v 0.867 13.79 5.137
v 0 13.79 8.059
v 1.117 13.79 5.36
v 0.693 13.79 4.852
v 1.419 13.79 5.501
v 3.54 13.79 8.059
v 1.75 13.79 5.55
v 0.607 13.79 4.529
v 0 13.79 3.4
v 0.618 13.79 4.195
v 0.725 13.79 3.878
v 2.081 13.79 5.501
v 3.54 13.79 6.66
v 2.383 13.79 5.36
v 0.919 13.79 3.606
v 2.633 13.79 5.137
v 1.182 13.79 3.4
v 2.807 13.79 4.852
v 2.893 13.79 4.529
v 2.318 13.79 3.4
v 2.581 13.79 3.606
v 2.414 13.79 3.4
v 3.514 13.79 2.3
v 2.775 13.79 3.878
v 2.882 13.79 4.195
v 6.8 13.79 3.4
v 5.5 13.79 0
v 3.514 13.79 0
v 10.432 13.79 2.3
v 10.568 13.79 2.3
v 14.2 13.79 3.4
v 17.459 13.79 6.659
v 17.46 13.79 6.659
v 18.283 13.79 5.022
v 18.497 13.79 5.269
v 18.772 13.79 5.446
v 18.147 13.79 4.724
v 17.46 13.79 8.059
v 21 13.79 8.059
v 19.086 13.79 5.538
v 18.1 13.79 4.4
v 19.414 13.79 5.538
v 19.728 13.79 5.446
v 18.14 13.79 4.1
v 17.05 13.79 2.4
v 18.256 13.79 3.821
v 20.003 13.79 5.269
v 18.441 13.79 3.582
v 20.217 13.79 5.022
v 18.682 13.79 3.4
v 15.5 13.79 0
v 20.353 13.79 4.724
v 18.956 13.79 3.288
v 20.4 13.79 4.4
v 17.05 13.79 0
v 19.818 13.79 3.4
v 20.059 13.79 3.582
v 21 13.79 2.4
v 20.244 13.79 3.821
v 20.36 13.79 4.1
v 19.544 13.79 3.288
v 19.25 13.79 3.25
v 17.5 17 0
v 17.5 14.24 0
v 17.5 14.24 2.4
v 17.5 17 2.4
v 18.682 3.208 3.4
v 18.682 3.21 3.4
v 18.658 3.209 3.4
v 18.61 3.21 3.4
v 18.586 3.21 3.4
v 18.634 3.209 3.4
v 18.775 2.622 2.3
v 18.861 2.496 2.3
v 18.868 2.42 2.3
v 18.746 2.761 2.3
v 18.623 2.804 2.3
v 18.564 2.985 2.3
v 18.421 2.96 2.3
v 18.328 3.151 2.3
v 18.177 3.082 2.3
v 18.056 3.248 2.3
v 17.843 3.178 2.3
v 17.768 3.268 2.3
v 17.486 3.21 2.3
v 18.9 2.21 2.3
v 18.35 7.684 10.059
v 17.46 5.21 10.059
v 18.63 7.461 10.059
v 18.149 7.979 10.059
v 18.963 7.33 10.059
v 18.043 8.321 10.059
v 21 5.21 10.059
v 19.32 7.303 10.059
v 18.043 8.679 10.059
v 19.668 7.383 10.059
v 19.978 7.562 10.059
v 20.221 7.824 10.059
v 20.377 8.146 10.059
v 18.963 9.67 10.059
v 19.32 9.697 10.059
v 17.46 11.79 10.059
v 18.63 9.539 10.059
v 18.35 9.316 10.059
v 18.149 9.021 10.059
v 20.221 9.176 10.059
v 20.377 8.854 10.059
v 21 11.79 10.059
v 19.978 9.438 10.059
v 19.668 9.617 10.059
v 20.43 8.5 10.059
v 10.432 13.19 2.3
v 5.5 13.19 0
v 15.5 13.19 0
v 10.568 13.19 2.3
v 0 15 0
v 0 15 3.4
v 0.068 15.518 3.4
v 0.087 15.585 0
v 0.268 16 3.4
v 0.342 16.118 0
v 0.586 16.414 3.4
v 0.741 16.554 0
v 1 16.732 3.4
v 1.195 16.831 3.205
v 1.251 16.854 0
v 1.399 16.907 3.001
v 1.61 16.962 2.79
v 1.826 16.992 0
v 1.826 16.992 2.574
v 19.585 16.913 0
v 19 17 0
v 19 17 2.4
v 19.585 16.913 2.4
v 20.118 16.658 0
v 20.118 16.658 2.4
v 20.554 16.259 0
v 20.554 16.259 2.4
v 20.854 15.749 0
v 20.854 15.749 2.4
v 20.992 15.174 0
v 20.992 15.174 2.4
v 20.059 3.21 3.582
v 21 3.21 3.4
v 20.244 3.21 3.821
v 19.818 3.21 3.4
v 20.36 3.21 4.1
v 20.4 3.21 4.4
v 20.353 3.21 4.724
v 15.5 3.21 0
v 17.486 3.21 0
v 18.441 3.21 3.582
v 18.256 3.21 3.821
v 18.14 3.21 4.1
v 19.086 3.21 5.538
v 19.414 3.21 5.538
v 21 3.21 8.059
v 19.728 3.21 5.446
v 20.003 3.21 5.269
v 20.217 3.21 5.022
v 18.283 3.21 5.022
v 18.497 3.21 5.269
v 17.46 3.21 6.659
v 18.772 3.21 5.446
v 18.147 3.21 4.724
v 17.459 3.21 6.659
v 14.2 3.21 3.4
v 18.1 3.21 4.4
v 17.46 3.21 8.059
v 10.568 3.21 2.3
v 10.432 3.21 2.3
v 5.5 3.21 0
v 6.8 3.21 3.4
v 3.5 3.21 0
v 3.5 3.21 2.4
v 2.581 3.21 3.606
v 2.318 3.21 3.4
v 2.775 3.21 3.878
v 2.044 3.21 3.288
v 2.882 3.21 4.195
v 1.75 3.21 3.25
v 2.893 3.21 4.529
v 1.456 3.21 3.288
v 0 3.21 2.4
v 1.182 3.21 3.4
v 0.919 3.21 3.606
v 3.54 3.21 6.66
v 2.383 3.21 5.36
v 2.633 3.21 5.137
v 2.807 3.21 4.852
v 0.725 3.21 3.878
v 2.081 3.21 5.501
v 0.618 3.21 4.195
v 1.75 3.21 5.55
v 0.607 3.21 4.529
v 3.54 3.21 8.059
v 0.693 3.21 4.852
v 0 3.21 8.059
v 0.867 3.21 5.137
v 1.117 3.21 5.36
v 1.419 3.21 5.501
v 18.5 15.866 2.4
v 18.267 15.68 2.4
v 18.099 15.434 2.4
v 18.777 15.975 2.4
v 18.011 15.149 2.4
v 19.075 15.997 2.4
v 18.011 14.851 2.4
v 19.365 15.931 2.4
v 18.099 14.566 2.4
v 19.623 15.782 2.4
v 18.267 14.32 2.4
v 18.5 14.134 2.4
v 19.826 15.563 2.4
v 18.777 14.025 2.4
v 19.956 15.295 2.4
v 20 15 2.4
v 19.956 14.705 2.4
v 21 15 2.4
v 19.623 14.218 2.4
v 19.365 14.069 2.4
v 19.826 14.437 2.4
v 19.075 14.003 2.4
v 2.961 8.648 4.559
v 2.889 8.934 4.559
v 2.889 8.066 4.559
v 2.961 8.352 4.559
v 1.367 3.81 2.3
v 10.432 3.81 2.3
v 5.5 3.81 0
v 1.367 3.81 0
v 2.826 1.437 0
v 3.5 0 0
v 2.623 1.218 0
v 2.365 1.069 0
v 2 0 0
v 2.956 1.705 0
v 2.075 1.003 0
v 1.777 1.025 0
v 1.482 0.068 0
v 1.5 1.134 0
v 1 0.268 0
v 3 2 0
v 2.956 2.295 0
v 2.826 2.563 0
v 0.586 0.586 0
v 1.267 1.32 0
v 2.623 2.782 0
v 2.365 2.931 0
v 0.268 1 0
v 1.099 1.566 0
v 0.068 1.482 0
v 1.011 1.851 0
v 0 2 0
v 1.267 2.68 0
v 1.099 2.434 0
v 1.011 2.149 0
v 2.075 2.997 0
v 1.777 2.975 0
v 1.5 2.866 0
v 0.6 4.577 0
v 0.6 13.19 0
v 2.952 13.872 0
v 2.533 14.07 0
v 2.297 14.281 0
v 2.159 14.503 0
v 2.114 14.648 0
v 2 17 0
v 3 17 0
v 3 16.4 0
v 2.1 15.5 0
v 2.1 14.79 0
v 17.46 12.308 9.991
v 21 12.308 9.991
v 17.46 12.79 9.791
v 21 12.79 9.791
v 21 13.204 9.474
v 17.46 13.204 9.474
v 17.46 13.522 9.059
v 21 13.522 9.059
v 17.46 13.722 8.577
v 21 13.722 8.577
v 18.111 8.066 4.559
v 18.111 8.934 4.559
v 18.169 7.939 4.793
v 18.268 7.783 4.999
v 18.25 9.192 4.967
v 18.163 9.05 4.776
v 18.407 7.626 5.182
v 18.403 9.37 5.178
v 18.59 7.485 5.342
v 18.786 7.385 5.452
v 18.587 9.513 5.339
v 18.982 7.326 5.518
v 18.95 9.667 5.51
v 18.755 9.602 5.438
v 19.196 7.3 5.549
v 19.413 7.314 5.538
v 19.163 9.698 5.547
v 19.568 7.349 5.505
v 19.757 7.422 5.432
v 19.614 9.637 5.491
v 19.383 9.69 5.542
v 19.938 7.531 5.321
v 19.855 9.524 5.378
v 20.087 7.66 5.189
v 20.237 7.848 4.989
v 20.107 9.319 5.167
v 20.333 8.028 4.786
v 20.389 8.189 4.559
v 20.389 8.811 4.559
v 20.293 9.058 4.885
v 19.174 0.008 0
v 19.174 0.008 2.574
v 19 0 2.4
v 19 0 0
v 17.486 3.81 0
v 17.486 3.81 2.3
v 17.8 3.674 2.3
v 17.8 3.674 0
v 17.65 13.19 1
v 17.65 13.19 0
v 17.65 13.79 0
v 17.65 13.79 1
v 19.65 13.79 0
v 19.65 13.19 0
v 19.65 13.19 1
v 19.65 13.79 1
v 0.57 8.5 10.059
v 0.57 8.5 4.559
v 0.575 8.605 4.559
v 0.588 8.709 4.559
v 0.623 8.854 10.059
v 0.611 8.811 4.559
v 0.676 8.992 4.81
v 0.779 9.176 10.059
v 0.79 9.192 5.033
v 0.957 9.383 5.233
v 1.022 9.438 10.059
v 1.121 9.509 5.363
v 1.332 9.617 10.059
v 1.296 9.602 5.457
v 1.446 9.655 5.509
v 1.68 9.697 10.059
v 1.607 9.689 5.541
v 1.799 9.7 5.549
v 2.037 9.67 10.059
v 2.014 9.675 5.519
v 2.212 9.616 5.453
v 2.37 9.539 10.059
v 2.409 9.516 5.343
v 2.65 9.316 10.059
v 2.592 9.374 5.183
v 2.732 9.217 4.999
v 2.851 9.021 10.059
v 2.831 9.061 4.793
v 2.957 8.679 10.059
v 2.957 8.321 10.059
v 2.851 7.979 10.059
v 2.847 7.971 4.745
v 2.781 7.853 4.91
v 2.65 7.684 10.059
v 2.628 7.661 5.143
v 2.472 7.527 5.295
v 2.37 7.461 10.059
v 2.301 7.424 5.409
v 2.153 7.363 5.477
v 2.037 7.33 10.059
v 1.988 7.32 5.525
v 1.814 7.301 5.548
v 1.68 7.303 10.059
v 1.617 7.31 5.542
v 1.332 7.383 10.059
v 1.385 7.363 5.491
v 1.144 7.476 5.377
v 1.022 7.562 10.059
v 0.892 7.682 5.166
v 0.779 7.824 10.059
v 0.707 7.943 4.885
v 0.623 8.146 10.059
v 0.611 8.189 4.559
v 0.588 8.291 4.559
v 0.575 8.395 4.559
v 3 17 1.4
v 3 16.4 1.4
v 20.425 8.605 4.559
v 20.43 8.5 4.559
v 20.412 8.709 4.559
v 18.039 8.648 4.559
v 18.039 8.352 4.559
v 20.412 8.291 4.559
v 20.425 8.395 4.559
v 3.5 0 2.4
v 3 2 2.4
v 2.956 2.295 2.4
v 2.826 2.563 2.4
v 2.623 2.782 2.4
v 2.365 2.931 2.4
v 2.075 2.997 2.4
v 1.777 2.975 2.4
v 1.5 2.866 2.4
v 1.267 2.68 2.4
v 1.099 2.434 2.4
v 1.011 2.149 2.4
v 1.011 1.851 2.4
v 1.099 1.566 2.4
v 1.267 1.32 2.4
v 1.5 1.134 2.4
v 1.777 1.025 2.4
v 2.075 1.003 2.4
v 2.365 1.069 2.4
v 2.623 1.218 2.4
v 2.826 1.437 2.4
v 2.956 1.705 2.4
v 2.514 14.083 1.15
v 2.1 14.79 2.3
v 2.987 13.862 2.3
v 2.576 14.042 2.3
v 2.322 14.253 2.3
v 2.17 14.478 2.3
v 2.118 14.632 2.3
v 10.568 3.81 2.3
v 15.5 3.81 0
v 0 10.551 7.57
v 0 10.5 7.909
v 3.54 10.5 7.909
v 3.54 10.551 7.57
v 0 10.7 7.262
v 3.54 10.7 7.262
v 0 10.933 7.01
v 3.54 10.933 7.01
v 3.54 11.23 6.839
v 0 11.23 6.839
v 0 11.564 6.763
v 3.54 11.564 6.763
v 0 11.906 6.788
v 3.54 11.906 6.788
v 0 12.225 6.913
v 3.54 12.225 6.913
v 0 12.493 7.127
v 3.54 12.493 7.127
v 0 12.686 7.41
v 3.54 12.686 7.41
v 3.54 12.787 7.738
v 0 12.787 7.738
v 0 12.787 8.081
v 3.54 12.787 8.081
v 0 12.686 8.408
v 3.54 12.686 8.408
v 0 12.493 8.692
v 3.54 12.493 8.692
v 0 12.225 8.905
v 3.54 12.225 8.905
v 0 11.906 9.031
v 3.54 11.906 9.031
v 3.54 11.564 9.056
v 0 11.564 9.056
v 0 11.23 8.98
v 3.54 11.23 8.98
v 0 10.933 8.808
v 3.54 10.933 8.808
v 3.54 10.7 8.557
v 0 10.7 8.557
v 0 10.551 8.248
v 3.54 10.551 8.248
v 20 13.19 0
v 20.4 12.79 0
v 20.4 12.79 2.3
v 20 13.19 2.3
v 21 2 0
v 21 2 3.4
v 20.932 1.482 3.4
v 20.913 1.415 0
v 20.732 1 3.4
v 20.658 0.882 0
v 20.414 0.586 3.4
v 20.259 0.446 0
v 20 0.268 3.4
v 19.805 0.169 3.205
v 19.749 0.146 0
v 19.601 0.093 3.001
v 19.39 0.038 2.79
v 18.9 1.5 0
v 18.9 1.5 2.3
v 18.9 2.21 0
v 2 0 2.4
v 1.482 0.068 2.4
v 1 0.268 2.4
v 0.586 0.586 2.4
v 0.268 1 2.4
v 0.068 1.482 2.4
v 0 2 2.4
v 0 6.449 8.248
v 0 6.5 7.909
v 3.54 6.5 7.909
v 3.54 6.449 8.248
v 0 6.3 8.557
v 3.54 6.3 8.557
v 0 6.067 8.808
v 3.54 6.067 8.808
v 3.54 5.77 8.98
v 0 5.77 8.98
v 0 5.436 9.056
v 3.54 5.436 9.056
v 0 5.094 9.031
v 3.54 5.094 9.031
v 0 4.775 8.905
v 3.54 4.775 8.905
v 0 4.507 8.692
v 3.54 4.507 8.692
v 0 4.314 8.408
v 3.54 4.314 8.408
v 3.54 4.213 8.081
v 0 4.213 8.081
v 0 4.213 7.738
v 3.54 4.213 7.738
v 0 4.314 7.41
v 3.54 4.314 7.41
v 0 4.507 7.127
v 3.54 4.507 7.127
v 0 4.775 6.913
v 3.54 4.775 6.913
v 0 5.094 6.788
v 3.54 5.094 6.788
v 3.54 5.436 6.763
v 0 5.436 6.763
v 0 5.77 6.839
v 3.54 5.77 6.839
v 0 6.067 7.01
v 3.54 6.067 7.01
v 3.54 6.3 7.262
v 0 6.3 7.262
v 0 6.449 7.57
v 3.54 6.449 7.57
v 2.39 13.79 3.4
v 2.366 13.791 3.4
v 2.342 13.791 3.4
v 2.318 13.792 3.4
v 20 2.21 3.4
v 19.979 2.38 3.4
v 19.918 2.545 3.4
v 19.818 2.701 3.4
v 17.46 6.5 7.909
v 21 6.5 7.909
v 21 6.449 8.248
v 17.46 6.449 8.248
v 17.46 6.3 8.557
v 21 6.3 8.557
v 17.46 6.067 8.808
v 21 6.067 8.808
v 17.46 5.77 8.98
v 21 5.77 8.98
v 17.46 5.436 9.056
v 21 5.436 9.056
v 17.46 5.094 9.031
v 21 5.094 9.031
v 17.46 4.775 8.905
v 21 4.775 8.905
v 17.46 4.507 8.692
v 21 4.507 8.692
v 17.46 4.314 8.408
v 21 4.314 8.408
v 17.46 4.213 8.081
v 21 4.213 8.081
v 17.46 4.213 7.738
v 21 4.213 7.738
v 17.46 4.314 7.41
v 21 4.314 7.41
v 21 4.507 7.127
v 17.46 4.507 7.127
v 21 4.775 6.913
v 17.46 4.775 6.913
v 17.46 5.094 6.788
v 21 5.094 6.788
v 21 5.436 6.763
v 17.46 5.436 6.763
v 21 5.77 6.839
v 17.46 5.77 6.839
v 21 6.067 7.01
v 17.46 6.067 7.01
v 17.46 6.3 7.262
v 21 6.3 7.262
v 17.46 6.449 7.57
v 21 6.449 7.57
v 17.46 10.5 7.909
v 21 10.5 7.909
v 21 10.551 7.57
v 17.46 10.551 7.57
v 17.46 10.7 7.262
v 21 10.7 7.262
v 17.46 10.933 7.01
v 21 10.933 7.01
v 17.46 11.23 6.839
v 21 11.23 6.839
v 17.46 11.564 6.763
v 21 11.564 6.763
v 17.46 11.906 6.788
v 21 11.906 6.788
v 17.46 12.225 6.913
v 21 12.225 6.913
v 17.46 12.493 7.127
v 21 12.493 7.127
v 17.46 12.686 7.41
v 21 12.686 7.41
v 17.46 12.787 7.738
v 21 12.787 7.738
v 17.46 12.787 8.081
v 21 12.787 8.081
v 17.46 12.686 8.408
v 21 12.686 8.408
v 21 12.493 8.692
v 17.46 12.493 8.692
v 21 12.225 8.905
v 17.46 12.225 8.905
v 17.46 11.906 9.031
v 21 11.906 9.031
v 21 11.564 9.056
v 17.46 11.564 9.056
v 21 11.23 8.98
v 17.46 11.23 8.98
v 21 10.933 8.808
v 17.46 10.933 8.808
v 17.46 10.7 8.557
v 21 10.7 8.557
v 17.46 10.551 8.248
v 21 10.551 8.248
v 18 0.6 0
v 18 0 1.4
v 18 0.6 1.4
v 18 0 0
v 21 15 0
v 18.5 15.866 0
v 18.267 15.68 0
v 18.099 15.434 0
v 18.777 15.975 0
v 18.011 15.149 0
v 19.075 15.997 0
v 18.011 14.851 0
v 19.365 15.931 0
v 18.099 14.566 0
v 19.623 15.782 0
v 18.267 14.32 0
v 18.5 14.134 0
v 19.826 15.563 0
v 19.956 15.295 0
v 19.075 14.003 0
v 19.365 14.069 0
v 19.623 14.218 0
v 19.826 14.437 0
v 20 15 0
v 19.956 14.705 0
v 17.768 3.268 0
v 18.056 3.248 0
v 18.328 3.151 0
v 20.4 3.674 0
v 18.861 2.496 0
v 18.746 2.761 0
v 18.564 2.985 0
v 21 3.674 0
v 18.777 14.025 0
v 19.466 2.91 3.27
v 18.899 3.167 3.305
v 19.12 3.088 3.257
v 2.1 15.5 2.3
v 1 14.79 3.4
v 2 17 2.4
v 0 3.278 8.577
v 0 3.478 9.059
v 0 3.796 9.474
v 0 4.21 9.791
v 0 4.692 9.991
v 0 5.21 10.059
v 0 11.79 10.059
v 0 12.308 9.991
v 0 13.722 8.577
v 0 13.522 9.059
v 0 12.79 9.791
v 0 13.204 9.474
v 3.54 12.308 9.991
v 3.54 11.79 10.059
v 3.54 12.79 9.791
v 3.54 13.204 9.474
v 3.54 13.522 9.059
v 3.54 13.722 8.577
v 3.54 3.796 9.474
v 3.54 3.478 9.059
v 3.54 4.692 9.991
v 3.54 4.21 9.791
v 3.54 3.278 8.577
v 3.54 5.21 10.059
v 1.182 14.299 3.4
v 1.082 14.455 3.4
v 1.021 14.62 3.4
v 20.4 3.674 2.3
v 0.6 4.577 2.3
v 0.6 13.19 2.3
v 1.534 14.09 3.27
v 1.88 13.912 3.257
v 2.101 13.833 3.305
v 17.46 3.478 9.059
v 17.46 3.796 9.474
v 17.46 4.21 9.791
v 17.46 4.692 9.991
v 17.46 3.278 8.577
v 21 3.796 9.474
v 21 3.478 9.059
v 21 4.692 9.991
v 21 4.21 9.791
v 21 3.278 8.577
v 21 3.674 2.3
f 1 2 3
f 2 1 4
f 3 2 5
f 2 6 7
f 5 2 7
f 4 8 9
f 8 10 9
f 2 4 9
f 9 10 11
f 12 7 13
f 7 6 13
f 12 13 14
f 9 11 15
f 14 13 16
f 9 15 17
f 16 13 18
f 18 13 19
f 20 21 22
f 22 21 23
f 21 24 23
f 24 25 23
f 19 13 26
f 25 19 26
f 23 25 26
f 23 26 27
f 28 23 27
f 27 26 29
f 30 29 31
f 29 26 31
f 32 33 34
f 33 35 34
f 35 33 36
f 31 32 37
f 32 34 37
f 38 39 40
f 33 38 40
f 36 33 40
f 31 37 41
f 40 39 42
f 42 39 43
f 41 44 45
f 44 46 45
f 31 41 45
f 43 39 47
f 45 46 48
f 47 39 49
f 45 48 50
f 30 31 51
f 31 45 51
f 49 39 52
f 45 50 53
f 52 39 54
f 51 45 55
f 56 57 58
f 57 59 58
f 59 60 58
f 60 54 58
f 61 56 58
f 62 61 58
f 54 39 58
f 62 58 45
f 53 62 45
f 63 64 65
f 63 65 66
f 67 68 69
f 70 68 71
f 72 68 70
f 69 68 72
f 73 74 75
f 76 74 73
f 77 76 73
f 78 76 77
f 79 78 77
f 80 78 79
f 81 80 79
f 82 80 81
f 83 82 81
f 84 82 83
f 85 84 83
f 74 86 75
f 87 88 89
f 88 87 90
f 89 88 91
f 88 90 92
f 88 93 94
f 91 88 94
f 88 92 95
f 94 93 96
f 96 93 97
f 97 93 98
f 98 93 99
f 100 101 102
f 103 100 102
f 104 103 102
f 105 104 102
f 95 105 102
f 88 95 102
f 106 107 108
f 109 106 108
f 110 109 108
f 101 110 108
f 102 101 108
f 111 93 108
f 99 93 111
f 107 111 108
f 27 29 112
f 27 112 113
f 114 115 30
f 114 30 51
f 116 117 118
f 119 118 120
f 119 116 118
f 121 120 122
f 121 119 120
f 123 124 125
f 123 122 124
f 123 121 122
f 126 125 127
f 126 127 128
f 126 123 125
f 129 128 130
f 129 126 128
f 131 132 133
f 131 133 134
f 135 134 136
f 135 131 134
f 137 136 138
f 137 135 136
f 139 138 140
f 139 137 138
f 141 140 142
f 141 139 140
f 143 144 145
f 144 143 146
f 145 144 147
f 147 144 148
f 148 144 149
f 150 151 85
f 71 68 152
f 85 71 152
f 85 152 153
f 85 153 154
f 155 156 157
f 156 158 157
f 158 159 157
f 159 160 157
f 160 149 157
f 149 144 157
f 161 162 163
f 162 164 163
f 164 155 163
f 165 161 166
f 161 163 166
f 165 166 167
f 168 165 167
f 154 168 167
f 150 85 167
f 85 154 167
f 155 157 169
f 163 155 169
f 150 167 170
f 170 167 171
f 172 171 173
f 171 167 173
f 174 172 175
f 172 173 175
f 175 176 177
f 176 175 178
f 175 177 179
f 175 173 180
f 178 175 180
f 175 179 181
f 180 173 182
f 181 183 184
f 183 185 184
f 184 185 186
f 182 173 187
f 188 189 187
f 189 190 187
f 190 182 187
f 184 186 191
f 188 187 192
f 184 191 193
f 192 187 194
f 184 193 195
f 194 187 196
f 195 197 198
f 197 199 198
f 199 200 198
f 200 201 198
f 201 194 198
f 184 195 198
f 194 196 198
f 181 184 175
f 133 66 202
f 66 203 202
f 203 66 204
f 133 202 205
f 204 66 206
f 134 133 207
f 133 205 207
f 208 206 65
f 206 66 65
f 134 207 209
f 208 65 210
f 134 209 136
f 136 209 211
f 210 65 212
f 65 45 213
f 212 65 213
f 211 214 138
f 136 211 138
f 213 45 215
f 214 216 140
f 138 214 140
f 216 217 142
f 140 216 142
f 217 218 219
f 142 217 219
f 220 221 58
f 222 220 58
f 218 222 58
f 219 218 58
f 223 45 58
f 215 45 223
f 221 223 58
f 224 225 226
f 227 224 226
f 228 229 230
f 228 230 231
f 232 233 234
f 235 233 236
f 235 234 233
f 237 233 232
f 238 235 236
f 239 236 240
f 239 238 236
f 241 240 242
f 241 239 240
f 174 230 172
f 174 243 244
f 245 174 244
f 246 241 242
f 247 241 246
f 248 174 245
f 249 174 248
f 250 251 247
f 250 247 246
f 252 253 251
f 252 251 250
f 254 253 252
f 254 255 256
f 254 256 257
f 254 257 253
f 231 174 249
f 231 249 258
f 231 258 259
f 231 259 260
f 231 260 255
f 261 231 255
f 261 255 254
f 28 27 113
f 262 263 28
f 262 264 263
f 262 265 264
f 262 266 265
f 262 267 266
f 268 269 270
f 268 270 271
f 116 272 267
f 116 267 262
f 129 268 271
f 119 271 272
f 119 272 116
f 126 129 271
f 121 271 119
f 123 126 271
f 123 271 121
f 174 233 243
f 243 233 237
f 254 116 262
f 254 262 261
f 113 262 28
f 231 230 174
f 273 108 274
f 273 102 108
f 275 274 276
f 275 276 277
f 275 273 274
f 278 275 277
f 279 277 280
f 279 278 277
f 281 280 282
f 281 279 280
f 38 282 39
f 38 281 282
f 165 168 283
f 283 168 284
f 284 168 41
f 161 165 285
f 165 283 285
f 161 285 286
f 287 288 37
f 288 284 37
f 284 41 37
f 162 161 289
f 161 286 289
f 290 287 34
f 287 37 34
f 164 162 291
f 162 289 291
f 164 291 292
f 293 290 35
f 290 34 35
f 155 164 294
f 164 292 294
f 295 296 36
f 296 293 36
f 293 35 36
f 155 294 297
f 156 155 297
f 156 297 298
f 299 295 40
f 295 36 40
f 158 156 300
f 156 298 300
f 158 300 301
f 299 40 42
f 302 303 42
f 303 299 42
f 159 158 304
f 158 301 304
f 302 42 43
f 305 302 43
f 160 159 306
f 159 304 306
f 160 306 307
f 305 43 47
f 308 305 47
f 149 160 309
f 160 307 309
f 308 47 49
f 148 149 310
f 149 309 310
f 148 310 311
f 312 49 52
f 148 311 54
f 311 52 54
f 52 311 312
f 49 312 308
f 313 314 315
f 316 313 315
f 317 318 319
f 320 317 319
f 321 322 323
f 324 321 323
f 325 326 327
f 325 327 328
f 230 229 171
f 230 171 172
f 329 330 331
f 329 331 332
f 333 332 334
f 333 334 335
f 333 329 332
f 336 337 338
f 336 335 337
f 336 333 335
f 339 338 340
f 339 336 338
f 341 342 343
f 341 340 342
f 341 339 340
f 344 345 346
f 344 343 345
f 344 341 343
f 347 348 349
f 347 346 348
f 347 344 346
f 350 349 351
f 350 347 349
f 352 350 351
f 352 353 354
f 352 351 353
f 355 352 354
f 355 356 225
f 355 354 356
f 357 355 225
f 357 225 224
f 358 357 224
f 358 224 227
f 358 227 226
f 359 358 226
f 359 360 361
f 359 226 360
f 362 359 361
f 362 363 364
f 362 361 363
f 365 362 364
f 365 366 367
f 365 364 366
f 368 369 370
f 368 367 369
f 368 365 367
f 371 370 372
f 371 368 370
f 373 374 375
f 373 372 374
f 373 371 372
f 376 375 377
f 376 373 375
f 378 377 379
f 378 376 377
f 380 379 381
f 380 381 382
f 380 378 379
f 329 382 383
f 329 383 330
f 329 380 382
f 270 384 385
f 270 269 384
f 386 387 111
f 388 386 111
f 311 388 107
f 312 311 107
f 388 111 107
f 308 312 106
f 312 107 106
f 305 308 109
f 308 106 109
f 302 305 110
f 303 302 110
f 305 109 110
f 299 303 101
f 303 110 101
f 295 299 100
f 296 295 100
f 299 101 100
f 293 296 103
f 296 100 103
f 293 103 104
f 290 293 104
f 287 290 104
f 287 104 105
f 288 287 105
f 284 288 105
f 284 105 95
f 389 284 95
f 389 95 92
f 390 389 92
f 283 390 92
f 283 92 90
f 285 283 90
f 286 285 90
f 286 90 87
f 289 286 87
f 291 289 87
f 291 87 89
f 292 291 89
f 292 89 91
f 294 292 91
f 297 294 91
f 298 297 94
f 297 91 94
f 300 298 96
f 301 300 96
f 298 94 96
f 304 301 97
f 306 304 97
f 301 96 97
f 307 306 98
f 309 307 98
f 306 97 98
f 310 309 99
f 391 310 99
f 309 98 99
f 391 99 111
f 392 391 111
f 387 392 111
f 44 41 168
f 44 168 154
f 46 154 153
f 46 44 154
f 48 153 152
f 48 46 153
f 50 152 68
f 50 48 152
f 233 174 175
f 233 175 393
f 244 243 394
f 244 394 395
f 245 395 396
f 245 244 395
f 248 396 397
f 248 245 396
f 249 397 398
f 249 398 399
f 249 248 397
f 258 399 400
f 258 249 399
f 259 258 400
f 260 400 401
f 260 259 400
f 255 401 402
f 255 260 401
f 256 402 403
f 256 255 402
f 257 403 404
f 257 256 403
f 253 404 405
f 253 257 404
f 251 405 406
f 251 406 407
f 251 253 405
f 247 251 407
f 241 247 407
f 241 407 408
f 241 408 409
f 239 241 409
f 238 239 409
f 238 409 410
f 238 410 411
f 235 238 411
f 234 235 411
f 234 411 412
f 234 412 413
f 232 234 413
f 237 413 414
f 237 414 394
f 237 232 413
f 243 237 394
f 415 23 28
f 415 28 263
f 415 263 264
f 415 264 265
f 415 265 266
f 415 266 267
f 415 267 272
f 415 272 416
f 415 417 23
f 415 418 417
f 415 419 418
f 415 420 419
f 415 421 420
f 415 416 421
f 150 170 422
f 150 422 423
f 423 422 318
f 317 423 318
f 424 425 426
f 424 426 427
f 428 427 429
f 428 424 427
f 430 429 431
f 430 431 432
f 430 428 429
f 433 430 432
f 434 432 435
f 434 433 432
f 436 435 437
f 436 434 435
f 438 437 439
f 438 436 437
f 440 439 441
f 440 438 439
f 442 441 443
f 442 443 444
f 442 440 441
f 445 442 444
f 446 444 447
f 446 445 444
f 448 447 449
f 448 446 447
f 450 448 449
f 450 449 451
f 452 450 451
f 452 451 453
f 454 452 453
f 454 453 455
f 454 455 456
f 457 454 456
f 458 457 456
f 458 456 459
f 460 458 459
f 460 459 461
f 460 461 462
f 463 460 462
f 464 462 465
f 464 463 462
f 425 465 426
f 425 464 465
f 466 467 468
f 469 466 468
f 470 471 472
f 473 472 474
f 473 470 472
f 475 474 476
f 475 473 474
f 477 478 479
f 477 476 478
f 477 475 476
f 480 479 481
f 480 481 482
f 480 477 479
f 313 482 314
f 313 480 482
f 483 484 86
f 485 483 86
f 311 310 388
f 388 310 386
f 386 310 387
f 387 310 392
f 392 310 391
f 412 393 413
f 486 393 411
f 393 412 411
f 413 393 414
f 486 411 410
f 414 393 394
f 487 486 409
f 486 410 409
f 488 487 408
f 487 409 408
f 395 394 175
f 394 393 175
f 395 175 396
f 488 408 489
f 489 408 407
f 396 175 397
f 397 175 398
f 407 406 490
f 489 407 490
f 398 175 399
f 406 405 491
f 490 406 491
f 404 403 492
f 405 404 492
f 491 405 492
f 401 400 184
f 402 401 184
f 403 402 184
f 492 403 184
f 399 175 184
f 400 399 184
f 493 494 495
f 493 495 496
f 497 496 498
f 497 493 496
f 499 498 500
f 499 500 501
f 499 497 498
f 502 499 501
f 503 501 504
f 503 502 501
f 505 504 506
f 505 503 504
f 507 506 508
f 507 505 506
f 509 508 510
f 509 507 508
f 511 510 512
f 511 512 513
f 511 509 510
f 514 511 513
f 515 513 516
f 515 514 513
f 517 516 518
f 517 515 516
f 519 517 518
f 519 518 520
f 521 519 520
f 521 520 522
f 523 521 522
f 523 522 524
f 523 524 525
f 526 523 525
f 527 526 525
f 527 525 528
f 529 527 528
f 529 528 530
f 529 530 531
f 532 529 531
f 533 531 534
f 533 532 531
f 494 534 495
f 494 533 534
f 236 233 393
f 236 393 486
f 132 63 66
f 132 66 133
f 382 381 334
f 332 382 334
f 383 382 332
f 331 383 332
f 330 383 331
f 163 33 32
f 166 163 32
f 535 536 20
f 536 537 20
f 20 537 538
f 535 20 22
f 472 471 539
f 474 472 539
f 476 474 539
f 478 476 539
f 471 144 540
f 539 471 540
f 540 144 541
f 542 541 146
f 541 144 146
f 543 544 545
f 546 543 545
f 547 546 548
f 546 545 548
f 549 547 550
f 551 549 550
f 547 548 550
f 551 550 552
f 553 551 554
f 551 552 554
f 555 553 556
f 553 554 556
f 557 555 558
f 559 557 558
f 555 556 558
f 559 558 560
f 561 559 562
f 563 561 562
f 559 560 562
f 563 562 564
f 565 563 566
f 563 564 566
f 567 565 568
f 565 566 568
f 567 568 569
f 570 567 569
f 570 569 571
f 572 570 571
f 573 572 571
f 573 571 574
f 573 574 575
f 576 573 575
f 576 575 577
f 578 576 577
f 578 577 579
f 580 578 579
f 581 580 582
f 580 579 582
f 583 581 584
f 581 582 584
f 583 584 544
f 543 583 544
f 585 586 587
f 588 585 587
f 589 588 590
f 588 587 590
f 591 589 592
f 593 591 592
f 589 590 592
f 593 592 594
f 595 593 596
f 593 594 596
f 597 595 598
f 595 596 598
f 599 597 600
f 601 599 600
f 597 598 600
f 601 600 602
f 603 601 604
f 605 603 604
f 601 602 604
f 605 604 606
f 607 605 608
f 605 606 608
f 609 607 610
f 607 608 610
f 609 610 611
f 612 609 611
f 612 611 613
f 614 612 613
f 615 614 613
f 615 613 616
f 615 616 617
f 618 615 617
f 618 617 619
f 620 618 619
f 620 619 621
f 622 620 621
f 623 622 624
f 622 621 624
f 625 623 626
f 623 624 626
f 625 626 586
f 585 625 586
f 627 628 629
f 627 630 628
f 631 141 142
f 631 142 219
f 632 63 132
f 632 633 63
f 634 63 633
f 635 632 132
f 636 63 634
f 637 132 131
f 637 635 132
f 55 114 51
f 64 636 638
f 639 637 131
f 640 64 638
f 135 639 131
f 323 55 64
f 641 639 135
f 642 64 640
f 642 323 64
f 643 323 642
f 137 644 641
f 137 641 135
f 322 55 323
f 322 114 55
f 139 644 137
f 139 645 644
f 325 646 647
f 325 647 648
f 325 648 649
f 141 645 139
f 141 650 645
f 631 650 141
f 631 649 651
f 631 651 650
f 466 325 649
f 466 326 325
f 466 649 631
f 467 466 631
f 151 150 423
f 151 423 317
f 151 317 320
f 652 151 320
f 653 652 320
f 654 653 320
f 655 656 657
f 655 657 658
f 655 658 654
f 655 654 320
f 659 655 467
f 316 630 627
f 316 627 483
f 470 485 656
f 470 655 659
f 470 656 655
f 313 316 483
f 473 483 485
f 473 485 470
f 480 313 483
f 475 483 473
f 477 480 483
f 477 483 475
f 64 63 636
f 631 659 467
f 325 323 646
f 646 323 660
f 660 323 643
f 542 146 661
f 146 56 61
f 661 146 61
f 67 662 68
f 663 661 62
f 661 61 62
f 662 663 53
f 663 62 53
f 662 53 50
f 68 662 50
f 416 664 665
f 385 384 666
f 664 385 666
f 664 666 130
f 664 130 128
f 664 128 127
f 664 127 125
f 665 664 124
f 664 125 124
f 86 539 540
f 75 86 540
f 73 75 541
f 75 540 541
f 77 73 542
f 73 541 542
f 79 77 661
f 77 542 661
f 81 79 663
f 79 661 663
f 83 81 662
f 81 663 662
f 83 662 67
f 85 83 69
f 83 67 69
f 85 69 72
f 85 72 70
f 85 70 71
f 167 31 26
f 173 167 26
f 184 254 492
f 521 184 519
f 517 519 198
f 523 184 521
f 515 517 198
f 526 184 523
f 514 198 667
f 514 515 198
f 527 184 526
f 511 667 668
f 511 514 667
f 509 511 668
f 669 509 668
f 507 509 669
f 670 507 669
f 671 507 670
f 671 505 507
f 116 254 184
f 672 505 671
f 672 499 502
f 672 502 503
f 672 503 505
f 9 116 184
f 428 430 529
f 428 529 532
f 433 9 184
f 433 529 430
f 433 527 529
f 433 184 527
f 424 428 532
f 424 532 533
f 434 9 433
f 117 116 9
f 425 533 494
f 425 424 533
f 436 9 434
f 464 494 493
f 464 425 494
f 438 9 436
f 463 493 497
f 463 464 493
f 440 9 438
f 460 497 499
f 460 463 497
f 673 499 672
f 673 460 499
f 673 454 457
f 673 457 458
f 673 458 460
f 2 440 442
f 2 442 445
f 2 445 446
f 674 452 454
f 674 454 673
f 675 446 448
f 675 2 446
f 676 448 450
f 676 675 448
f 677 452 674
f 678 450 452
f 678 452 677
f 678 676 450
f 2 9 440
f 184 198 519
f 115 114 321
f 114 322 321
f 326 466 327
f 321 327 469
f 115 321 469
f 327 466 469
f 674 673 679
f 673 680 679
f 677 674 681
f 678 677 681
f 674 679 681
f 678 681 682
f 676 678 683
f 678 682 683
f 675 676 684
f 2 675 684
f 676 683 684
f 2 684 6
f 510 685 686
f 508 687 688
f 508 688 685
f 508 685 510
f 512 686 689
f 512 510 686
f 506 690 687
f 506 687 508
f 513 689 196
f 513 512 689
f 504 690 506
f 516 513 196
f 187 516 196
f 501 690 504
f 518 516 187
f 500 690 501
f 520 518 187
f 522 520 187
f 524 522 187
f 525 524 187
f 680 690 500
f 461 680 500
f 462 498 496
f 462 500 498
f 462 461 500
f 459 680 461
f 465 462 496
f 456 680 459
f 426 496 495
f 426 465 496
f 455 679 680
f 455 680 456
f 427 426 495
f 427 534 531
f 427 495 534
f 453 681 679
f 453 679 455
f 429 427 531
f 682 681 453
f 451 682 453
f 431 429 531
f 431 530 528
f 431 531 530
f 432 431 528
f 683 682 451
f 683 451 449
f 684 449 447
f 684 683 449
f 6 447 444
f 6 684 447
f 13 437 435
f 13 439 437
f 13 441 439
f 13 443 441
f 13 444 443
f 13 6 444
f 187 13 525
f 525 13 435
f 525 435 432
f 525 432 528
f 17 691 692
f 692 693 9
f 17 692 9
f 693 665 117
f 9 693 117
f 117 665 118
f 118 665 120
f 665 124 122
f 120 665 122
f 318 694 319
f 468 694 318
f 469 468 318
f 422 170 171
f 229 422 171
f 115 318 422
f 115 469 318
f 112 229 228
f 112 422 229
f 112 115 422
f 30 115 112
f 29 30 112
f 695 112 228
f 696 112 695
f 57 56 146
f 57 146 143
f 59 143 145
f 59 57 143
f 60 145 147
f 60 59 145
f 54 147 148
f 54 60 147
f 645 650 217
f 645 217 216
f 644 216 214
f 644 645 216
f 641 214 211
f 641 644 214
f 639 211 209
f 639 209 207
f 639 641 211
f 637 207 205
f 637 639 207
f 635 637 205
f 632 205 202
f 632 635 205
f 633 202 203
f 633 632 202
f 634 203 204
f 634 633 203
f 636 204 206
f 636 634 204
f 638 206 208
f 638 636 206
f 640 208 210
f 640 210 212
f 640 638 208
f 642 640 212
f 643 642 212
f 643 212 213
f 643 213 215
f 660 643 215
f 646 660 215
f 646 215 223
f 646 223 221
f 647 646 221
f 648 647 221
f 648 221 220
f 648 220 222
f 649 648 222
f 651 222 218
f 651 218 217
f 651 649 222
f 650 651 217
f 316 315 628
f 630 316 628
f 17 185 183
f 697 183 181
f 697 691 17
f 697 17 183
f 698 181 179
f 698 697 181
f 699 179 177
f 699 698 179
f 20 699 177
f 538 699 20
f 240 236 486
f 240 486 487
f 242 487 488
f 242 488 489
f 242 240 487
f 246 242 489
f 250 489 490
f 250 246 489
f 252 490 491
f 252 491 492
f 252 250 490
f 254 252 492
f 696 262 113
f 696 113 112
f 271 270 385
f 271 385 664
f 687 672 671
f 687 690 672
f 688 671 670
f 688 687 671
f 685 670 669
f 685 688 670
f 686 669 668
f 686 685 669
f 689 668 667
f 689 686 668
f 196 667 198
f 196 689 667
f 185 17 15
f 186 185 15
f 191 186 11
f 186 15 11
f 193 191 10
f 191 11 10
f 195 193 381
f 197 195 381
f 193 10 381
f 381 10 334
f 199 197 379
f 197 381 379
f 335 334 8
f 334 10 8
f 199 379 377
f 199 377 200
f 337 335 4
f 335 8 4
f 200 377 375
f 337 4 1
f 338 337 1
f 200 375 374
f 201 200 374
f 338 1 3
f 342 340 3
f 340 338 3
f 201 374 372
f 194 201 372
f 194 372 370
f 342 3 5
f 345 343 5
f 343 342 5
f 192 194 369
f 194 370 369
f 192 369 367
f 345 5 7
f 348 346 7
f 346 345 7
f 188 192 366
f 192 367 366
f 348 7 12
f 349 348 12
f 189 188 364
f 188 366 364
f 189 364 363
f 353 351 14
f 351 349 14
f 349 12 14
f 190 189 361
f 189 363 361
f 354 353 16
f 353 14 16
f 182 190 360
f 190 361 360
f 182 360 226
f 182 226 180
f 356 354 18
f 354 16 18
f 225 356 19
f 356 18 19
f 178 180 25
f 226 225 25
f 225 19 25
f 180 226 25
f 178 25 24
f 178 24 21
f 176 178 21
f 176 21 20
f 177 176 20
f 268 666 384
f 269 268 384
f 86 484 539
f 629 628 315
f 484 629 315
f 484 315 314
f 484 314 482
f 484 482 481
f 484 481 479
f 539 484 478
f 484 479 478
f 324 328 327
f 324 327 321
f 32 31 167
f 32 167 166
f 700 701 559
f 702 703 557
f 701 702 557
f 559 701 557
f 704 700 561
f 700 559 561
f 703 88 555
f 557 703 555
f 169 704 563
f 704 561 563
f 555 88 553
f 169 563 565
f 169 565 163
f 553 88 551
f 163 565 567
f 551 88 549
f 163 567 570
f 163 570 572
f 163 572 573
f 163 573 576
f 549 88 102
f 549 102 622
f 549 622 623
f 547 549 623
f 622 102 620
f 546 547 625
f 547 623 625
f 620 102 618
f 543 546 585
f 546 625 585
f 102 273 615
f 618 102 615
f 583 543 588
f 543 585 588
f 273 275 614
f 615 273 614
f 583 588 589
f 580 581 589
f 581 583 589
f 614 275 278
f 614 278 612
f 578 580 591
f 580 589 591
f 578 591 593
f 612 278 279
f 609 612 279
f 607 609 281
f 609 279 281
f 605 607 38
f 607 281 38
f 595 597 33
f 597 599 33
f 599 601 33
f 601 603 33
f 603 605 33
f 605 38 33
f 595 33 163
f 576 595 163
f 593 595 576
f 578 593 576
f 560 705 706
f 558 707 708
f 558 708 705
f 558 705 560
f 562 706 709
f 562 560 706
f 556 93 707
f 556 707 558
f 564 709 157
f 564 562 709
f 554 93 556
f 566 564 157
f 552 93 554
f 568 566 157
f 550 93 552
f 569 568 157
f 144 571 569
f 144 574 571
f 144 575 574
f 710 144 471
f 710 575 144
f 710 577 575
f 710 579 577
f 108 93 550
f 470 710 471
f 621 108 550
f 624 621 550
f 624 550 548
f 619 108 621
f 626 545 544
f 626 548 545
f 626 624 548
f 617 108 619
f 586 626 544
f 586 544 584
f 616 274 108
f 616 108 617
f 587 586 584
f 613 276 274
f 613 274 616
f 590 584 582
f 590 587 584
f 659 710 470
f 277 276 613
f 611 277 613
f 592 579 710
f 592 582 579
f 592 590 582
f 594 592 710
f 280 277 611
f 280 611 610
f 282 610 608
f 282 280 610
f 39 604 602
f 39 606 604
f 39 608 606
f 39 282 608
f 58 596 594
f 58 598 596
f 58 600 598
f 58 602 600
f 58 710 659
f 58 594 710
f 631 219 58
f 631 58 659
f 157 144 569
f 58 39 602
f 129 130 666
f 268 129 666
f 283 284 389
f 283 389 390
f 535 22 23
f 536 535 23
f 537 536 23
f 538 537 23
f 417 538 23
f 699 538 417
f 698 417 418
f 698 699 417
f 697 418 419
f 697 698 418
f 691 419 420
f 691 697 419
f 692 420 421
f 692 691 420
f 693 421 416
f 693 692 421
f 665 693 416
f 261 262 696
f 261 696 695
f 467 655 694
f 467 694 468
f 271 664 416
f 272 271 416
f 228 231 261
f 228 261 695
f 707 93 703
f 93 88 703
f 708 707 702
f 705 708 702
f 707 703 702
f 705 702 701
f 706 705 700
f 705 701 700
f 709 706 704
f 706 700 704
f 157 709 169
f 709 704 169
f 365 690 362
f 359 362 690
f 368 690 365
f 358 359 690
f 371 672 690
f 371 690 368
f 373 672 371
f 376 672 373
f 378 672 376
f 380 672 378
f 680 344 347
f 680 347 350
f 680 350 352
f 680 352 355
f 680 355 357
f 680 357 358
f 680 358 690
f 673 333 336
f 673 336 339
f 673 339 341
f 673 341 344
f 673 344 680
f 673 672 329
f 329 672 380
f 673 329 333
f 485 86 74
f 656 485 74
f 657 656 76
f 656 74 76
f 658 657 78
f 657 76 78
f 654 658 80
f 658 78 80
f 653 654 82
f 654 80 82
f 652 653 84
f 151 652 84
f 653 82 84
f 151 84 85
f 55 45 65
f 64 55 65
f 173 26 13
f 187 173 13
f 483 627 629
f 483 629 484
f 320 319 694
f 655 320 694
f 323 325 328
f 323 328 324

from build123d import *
from build123d.topology import SkipClean

# Parameters (mm, degrees)
SKETCH1_R                = 1
BOSS_EXTRUDE2_DEPTH      = 2.4
BOSS_EXTRUDE2_2_DEPTH    = 2.4
BOSS_EXTRUDE5_DEPTH      = 1
BOSS_EXTRUDE5_DEPTH_BACK = 0.1
CHAMFER1_SIZE            = 2
FILLET1_R                = 1
BOSS_EXTRUDE6_DEPTH      = 10.58
SKETCH9_R                = 1.15
CUT_EXTRUDE5_DEPTH       = 26.864775274
BOSS_EXTRUDE10_DEPTH     = 10.58
CHAMFER4_SIZE            = 3.3
SKETCH12_W               = 3.4
SKETCH12_H               = 10.58
SKETCH12_R               = 1.15
BOSS_EXTRUDE11_DEPTH     = 3.54
FILLET2_R                = 2
SKETCH13_R               = 1.2
CUT_EXTRUDE7_DEPTH       = 5.5
CHAMFER4_OF_MIRROR1_SIZE = 3.3
FILLET2_OF_MIRROR1_R     = 2
CHAMFER3_SIZE            = 1
SKETCH6_W                = 17.485786438
SKETCH6_H                = 0.6
BOSS_EXTRUDE8_DEPTH      = 2.3
SKETCH7_W                = 2
SKETCH7_H                = 0.6
CUT_EXTRUDE4_DEPTH       = 1
SKETCH11_W               = 10
SKETCH11_H               = 0.6
CUT_EXTRUDE6_DEPTH       = 2.3
CHAMFER5_SIZE            = 4.932365917
CHAMFER5_SIZE_2          = 2.3
CHAMFER6_SIZE            = 0.45


with BuildPart() as part:
    # Sketch1 → Boss-Extrude2 (new body)
    with BuildSketch(Plane.XY):
        with BuildLine():
            Line((0.6, 14), (0.6, 3.577))
            Line((0.6, 3.577), (3.5, 3.577))
            Line((3.5, 3.577), (3.5, 0))
            Line((3.5, 0), (2, 0))
            ThreePointArc((2, 0), (0.585786, 0.585786), (0, 2))
            Line((0, 2), (0, 15))
            ThreePointArc((0, 15), (0.52544374, 16.351186251), (1.82569, 16.9924))
            Line((1.82569, 16.9924), (2, 17))
            Line((2, 17), (3, 17))
            Line((3, 17), (3, 16.4))
            Line((3, 16.4), (0.6, 14))
        make_face()
        with Locations((1.999998506, 1.999998506)):
            Circle(SKETCH1_R, mode=Mode.SUBTRACT)
    extrude(amount=BOSS_EXTRUDE2_DEPTH)



with BuildPart() as body_2:
    # Sketch1 → Boss-Extrude2 2 (new body)
    with BuildSketch(Plane.XY):
        with BuildLine():
            Line((20.4, 3), (20.4, 13.79))
            Line((20.4, 13.79), (17.5, 13.79))
            Line((17.5, 13.79), (17.5, 17))
            Line((17.5, 17), (19, 17))
            ThreePointArc((19, 17), (20.351188195, 16.47455126), (20.9924, 15.1743))
            Line((20.9924, 15.1743), (21, 15))
            Line((21, 15), (21, 2))
            ThreePointArc((21, 2), (20.474549436, 0.648816495), (19.1743, 0.00760938))
            Line((19.1743, 0.00760938), (19, 0))
            Line((19, 0), (18, 0))
            Line((18, 0), (18, 0.6))
            Line((18, 0.6), (20.4, 3))
        make_face()
        with Locations((18.999999966, 14.999989488)):
            Circle(SKETCH1_R, mode=Mode.SUBTRACT)
    extrude(amount=BOSS_EXTRUDE2_2_DEPTH)


with BuildPart() as part_1:
    add(part.part)

    add(body_2.part)  # Boss-Extrude5 merges body 2
    # Sketch2 → Boss-Extrude5 (add, two sides: drawn at the far end of the back side and taken through both)
    with BuildSketch(Plane.XY.offset(2.4).offset(-BOSS_EXTRUDE5_DEPTH_BACK)):
        with BuildLine():
            Line((3, 13.79), (21, 13.79))
            Line((21, 13.79), (21, 2))
            ThreePointArc((21, 2), (20.474549436, 0.648816495), (19.1743, 0.00760938))
            Line((19.1743, 0.00760938), (19, 0))
            Line((19, 0), (18, 0))
            Line((18, 0), (18, 3.21))
            Line((18, 3.21), (0, 3.21))
            Line((0, 3.21), (0, 15))
            ThreePointArc((0, 15), (0.52544374, 16.351186251), (1.82569, 16.9924))
            Line((1.82569, 16.9924), (2, 17))
            Line((2, 17), (3, 17))
            Line((3, 17), (3, 13.79))
        make_face()
    extrude(amount=BOSS_EXTRUDE5_DEPTH + BOSS_EXTRUDE5_DEPTH_BACK)

    # Chamfer1
    # the kernel refuses this chamfer: 2 mm, written as the material it takes off along each edge
    with BuildSketch(Plane(origin=(18, -5.143365976, 3.4), x_dir=(-0.027495876610585623, 0, -0.9996219169112968), z_dir=(0, 1, 0)), Plane(origin=(3, 22.143365976, 3.4), x_dir=(0.02749587661058627, 0, -0.9996219169112968), z_dir=(0, -1, 0))) as chamfer1_piece_1:
        Polygon((CHAMFER1_SIZE * 0.999621916911, -CHAMFER1_SIZE * 0.0274958766106), (-CHAMFER1_SIZE * 0.0274958766106, -CHAMFER1_SIZE * 0.999621916911), (0, 0), align=None)
    extrude(amount=8.353365976, mode=Mode.SUBTRACT)

    # Fillet1
    fillet1_edges = [part_1.edges().sort_by_distance(p)[0] for p in [
        (19.45, 3.21, 2.85),
        (1.55, 13.79, 2.85),
    ]]
    fillet(fillet1_edges, radius=FILLET1_R)

    # Sketch3 → Boss-Extrude6 (add)
    with BuildSketch(Plane(origin=(0, 13.79, 0), x_dir=(1, 0, 0), z_dir=(0, 1, 0))):
        with BuildLine():
            Line((21, -4.4), (21, -3.4))
            Line((21, -3.4), (19.817890835, -3.4))
            ThreePointArc((19.817890835, -3.4), (19.25, -5.55), (18.682109165, -3.4))
            Line((18.682109165, -3.4), (17.5, -3.4))
            Line((17.5, -3.4), (17.5, -4.4))
            ThreePointArc((17.5, -4.4), (19.25, -6.15), (21, -4.4))
        make_face()
    boss_extrude6 = extrude(amount=-BOSS_EXTRUDE6_DEPTH)

    # Sketch9 → Cut-Extrude5 (cut, symmetric)
    with BuildSketch(Plane(origin=(0, 13.79, 0), x_dir=(1, 0, 0), z_dir=(0, 1, 0))):
        with Locations(Location((19.25, -4.4, 0), (0, 0, 270))):
            Circle(SKETCH9_R)
    cut_extrude5 = extrude(amount=CUT_EXTRUDE5_DEPTH, both=True, mode=Mode.SUBTRACT)

    # Sketch10 → Boss-Extrude10 (add)
    with SkipClean():  # the faces are left unmerged after this step: merging them gives an invalid solid
        with BuildSketch(Plane(origin=(0, 13.79, 0), x_dir=(1, 0, 0), z_dir=(0, 1, 0))):
            with BuildLine():
                Line((17.5, -6.659370346), (17.5, -4.4))
                Line((17.5, -4.4), (18.1, -4.4))
                ThreePointArc((18.1, -4.4), (19.25, -5.55), (20.4, -4.4))
                Line((20.4, -4.4), (21, -4.4))
                Line((21, -4.4), (21, -6.659370346))
                Line((21, -6.659370346), (17.5, -6.659370346))
            make_face()
        boss_extrude10 = extrude(amount=-BOSS_EXTRUDE10_DEPTH)

    # Chamfer4
    # the kernel refuses this chamfer: 3.3 mm, written as the material it adds along each edge
    with BuildSketch(Plane(origin=(17.5, 13.79, 3.4), x_dir=(-0.9996219169112966, 0, -0.027495876610586684), z_dir=(0, -1, 0))) as chamfer4_piece_1_section:
        Polygon((CHAMFER4_SIZE * 0.999621916911, -CHAMFER4_SIZE * 0.0274958766106), (-CHAMFER4_SIZE * 0.0274958766106, -CHAMFER4_SIZE * 0.999621916911), (0, 0), align=None)
    chamfer4_piece_1 = extrude(amount=10.58, mode=Mode.PRIVATE)
    chamfer4_piece_1 = split(chamfer4_piece_1, bisect_by=Plane(origin=(16.408327536, 8.5, 6.659370346), z_dir=(0, 0, -1)), keep=Keep.TOP, mode=Mode.PRIVATE)
    add(chamfer4_piece_1)

    # Sketch12 → Boss-Extrude11 (add)
    with SkipClean():  # the faces are left unmerged after this step: merging them gives an invalid solid
        with BuildSketch(Plane(origin=(21, 0, 0), x_dir=(0, 0, -1), z_dir=(1, 0, 0))):
            with Locations((-8.359370346, 8.5)):
                Rectangle(SKETCH12_W, SKETCH12_H)
            with Locations(Location((-7.909370346, 5.35, 0), (0, 0, 90))):
                Circle(SKETCH12_R, mode=Mode.SUBTRACT)
            with Locations(Location((-7.909370346, 11.65, 0), (0, 0, 270))):
                Circle(SKETCH12_R, mode=Mode.SUBTRACT)
        boss_extrude11 = extrude(amount=-BOSS_EXTRUDE11_DEPTH)

    # Fillet2
    fillet2_edges = [part_1.edges().sort_by_distance(p)[0] for p in [
        (19.23, 3.21, 10.059370346),
        (19.23, 13.79, 10.059370346),
    ]]
    fillet(fillet2_edges, radius=FILLET2_R)

    # Sketch13 → Cut-Extrude7 (cut)
    with BuildSketch(Plane.XY.offset(10.059370346)):
        with Locations((19.23, 8.5)):
            Circle(SKETCH13_R)
    cut_extrude7 = extrude(amount=-CUT_EXTRUDE7_DEPTH, mode=Mode.SUBTRACT)

    # Mirror1: Boss-Extrude6, Cut-Extrude5, Boss-Extrude10, Boss-Extrude11, Cut-Extrude7 across plane
    with SkipClean():  # the faces are left unmerged after this step: merging them gives an invalid solid
        add(boss_extrude6.mirror(Plane.ZY.offset(-10.5)))
        add(cut_extrude5.mirror(Plane.ZY.offset(-10.5)), mode=Mode.SUBTRACT)
        add(boss_extrude10.mirror(Plane.ZY.offset(-10.5)))
        add(boss_extrude11.mirror(Plane.ZY.offset(-10.5)))
        add(cut_extrude7.mirror(Plane.ZY.offset(-10.5)), mode=Mode.SUBTRACT)

    # Chamfer4 of Mirror1
    # the kernel refuses this chamfer: 3.3 mm, written as the material it adds along each edge
    with BuildSketch(Plane(origin=(3.5, 13.79, 3.4), x_dir=(0.9996219169112966, 1.0675155552485545e-15, -0.027495876610586698), z_dir=(0, -1, 0))) as chamfer4_of_mirror1_piece_1:
        Polygon((CHAMFER4_OF_MIRROR1_SIZE * 0.999621916911, CHAMFER4_OF_MIRROR1_SIZE * 0.0274958766106), (-CHAMFER4_OF_MIRROR1_SIZE * 0.0274958766106, CHAMFER4_OF_MIRROR1_SIZE * 0.999621916911), (0, 0), align=None)
    extrude(amount=10.58)

    # Fillet2 of Mirror1
    fillet2_of_mirror1_edges = [part_1.edges().sort_by_distance(p)[0] for p in [
        (1.77, 3.21, 10.059370346),
        (1.77, 13.79, 10.059370346),
    ]]
    fillet(fillet2_of_mirror1_edges, radius=FILLET2_OF_MIRROR1_R)

    # Chamfer3
    chamfer3_edges = [part_1.edges().sort_by_distance(p)[0] for p in [
        (0.6, 3.577, 1.15),
        (20.4, 13.79, 1.15),
    ]]
    chamfer(chamfer3_edges, length=CHAMFER3_SIZE)

    # Sketch6 → Boss-Extrude8 (add)
    with SkipClean():  # the faces are left unmerged after this step: merging them gives an invalid solid
        with BuildSketch(Plane(origin=(0, 0, 2.3), x_dir=(-1, 0, 0), z_dir=(0, 0, -1))):
            with Locations((-8.742893219, 3.51)):
                Rectangle(SKETCH6_W, SKETCH6_H)
            with BuildLine():
                ThreePointArc((-18.9, 2.21), (-18.451712264, 3.076025404), (-17.485786438, 3.21))
                Line((-17.485786438, 3.21), (-17.485786438, 3.81))
                Line((-17.485786438, 3.81), (-17.8, 3.674))
                Line((-17.8, 3.674), (-21, 3.674))
                Line((-21, 3.674), (-20.4, 3))
                Line((-20.4, 3), (-20.4, 1.5))
                Line((-20.4, 1.5), (-18.9, 1.5))
                Line((-18.9, 1.5), (-18.9, 2.21))
            make_face()
            with BuildLine():
                Line((-3.514213562, 13.79), (-17.5, 13.79))
                Line((-17.5, 13.79), (-17.5, 13.89))
                Line((-17.5, 13.89), (-21, 13.89))
                Line((-21, 13.89), (-21, 13.19))
                Line((-21, 13.19), (-0.5, 13.19))
                Line((-0.5, 13.19), (-0.5, 15.5))
                Line((-0.5, 15.5), (-2.1, 15.5))
                Line((-2.1, 15.5), (-2.1, 14.79))
                add(Edge.make_bspline(
                    [(-3.514213562, 13.79), (-2.1, 13.79), (-2.1, 14.79)],
                    knots=[4.71238898, 4.71238898, 4.71238898, 6.283185307, 6.283185307, 6.283185307], degree=2, weights=[1, 0.707106781, 1]))
            make_face()
        extrude(amount=BOSS_EXTRUDE8_DEPTH)

    # Sketch7 → Cut-Extrude4 (cut)
    with SkipClean():  # the faces are left unmerged after this step: merging them gives an invalid solid
        with BuildSketch(Plane(origin=(0, 0, 0), x_dir=(-1, 0, 0), z_dir=(0, 0, -1))):
            with Locations((-18.65, 13.49)):
                Rectangle(SKETCH7_W, SKETCH7_H)
        extrude(amount=-CUT_EXTRUDE4_DEPTH, mode=Mode.SUBTRACT)

    # Sketch11 → Cut-Extrude6 (cut)
    with SkipClean():  # the faces are left unmerged after this step: merging them gives an invalid solid
        with BuildSketch(Plane(origin=(0, 0, 0), x_dir=(-1, 0, 0), z_dir=(0, 0, -1))):
            with Locations((-10.5, 3.51)):
                Rectangle(SKETCH11_W, SKETCH11_H)
            with Locations((-10.5, 13.49)):
                Rectangle(SKETCH11_W, SKETCH11_H)
        extrude(amount=-CUT_EXTRUDE6_DEPTH, mode=Mode.SUBTRACT)

    # Chamfer5
    # the kernel refuses this chamfer: 4.932365917, 2.3 mm, written as the material it adds along each edge
    with BuildSketch(Plane(origin=(15.5, 3.21, 2.3), x_dir=(-0.9998669641130704, 0, 0.016311164131110237), z_dir=(0, 1, 0))) as chamfer5_piece_1_section:
        Polygon((CHAMFER5_SIZE * 0.999866964148, -CHAMFER5_SIZE * 0.0163111641317), (-CHAMFER5_SIZE_2 * 0.0163111641311, -CHAMFER5_SIZE_2 * 0.999866964113), (0, 0), align=None)
    chamfer5_piece_1 = extrude(amount=0.6, mode=Mode.PRIVATE)
    chamfer5_piece_1 = split(chamfer5_piece_1, bisect_by=Plane(origin=(13.827499222, 3.51, 0), z_dir=(0, 0, 1)), keep=Keep.TOP, mode=Mode.PRIVATE)
    add(chamfer5_piece_1)
    with BuildSketch(Plane(origin=(15.5, 3.21, 2.3), x_dir=(-0.9998669641130704, 0, 0.016311164131110237), z_dir=(0, 1, 0))) as chamfer5_piece_2_section:
        Polygon((CHAMFER5_SIZE * 0.999866964148, -CHAMFER5_SIZE * 0.0163111641317), (-CHAMFER5_SIZE_2 * 0.0163111641311, -CHAMFER5_SIZE_2 * 0.999866964113), (0, 0), align=None)
    chamfer5_piece_2 = extrude(amount=13.379639107, mode=Mode.PRIVATE)
    chamfer5_piece_2 = split(chamfer5_piece_2, bisect_by=Plane(origin=(13.827499222, 13.79, 1.578386063), z_dir=(0, -1, 0)), keep=Keep.TOP, mode=Mode.PRIVATE)
    chamfer5_piece_2 = split(chamfer5_piece_2, bisect_by=Plane(origin=(13.827499222, 13.19, 1.578386063), z_dir=(0, 1, 0)), keep=Keep.TOP, mode=Mode.PRIVATE)
    chamfer5_piece_2 = split(chamfer5_piece_2, bisect_by=Plane(origin=(13.827499222, 13.49, 0), z_dir=(0, 0, 1)), keep=Keep.TOP, mode=Mode.PRIVATE)
    add(chamfer5_piece_2)
    with BuildSketch(Plane(origin=(5.5, 16.589639107, 2.3), x_dir=(0.9998669641130704, 0, 0.01631116413111024), z_dir=(0, -1, 0))) as chamfer5_piece_3_section:
        Polygon((CHAMFER5_SIZE * 0.999866964148, -CHAMFER5_SIZE * 0.0163111641317), (-CHAMFER5_SIZE_2 * 0.0163111641311, -CHAMFER5_SIZE_2 * 0.999866964113), (0, 0), align=None)
    chamfer5_piece_3 = extrude(amount=13.379639107, mode=Mode.PRIVATE)
    chamfer5_piece_3 = split(chamfer5_piece_3, bisect_by=Plane(origin=(7.172500778, 13.49, 0), z_dir=(0, 0, 1)), keep=Keep.TOP, mode=Mode.PRIVATE)
    chamfer5_piece_3 = split(chamfer5_piece_3, bisect_by=Plane(origin=(7.172500778, 13.19, 1.578386063), z_dir=(0, 1, 0)), keep=Keep.TOP, mode=Mode.PRIVATE)
    chamfer5_piece_3 = split(chamfer5_piece_3, bisect_by=Plane(origin=(7.172500778, 13.79, 1.578386063), z_dir=(0, -1, 0)), keep=Keep.TOP, mode=Mode.PRIVATE)
    add(chamfer5_piece_3)
    with BuildSketch(Plane(origin=(5.5, 3.81, 2.3), x_dir=(0.9998669641130704, 0, 0.01631116413111024), z_dir=(0, -1, 0))) as chamfer5_piece_4_section:
        Polygon((CHAMFER5_SIZE * 0.999866964148, -CHAMFER5_SIZE * 0.0163111641317), (-CHAMFER5_SIZE_2 * 0.0163111641311, -CHAMFER5_SIZE_2 * 0.999866964113), (0, 0), align=None)
    chamfer5_piece_4 = extrude(amount=0.6, mode=Mode.PRIVATE)
    chamfer5_piece_4 = split(chamfer5_piece_4, bisect_by=Plane(origin=(7.172500778, 3.51, 0), z_dir=(0, 0, 1)), keep=Keep.TOP, mode=Mode.PRIVATE)
    add(chamfer5_piece_4)
    with BuildSketch(Plane(origin=(15.5, 0.410360893, 2.3), x_dir=(-0.9998669641130704, 0, 0.016311164131110237), z_dir=(0, 1, 0))) as chamfer5_piece_5_section:
        Polygon((CHAMFER5_SIZE * 0.999866964148, -CHAMFER5_SIZE * 0.0163111641317), (-CHAMFER5_SIZE_2 * 0.0163111641311, -CHAMFER5_SIZE_2 * 0.999866964113), (0, 0), align=None)
    chamfer5_piece_5 = extrude(amount=13.379639107, mode=Mode.PRIVATE)
    chamfer5_piece_5 = split(chamfer5_piece_5, bisect_by=Plane(origin=(13.827499222, 3.21, 1.578386063), z_dir=(0, 1, 0)), keep=Keep.TOP, mode=Mode.PRIVATE)
    chamfer5_piece_5 = split(chamfer5_piece_5, bisect_by=Plane(origin=(13.827499222, 3.81, 1.578386063), z_dir=(0, -1, 0)), keep=Keep.TOP, mode=Mode.PRIVATE)
    chamfer5_piece_5 = split(chamfer5_piece_5, bisect_by=Plane(origin=(13.827499222, 3.51, 0), z_dir=(0, 0, 1)), keep=Keep.TOP, mode=Mode.PRIVATE)
    add(chamfer5_piece_5)
    with BuildSketch(Plane(origin=(15.5, 13.19, 2.3), x_dir=(-0.9998669641130704, 0, 0.016311164131110237), z_dir=(0, 1, 0))) as chamfer5_piece_6_section:
        Polygon((CHAMFER5_SIZE * 0.999866964148, -CHAMFER5_SIZE * 0.0163111641317), (-CHAMFER5_SIZE_2 * 0.0163111641311, -CHAMFER5_SIZE_2 * 0.999866964113), (0, 0), align=None)
    chamfer5_piece_6 = extrude(amount=0.6, mode=Mode.PRIVATE)
    chamfer5_piece_6 = split(chamfer5_piece_6, bisect_by=Plane(origin=(13.827499222, 13.49, 0), z_dir=(0, 0, 1)), keep=Keep.TOP, mode=Mode.PRIVATE)
    add(chamfer5_piece_6)
    with BuildSketch(Plane(origin=(5.5, 13.79, 2.3), x_dir=(-0.07481330637060017, 0, -0.9971975577536775), z_dir=(0, -1, 0))) as chamfer5_piece_7_section:
        Polygon((CHAMFER5_SIZE_2 * 0.997197557754, CHAMFER5_SIZE_2 * 0.0748133063706), (-CHAMFER5_SIZE * 0.0748133063732, CHAMFER5_SIZE * 0.997197557788), (0, 0), align=None)
    chamfer5_piece_7 = extrude(amount=0.6, mode=Mode.PRIVATE)
    chamfer5_piece_7 = split(chamfer5_piece_7, bisect_by=Plane(origin=(7.172500778, 13.49, 0), z_dir=(0, 0, 1)), keep=Keep.TOP, mode=Mode.PRIVATE)
    add(chamfer5_piece_7)
    with BuildSketch(Plane(origin=(5.5, 13.79, 2.3), x_dir=(-0.07481330637060017, 0, -0.9971975577536775), z_dir=(0, -1, 0))) as chamfer5_piece_8_section:
        Polygon((CHAMFER5_SIZE_2 * 0.997197557754, CHAMFER5_SIZE_2 * 0.0748133063706), (-CHAMFER5_SIZE * 0.0748133063732, CHAMFER5_SIZE * 0.997197557788), (0, 0), align=None)
    chamfer5_piece_8 = extrude(amount=13.379639107, mode=Mode.PRIVATE)
    chamfer5_piece_8 = split(chamfer5_piece_8, bisect_by=Plane(origin=(7.172500778, 3.51, 0), z_dir=(0, 0, 1)), keep=Keep.TOP, mode=Mode.PRIVATE)
    chamfer5_piece_8 = split(chamfer5_piece_8, bisect_by=Plane(origin=(7.172500778, 3.21, 1.578386063), z_dir=(0, 1, 0)), keep=Keep.TOP, mode=Mode.PRIVATE)
    chamfer5_piece_8 = split(chamfer5_piece_8, bisect_by=Plane(origin=(7.172500778, 3.81, 1.578386063), z_dir=(0, -1, 0)), keep=Keep.TOP, mode=Mode.PRIVATE)
    add(chamfer5_piece_8)

    # Chamfer6
    # the kernel refuses this chamfer: 0.45 mm, written as the material it adds along each edge
    with BuildSketch(Plane(origin=(17.5, 13.79, 0), x_dir=(-0.9996219169112969, -0.027495876610584467, 0), z_dir=(0, 0, 1))) as chamfer6_piece_1:
        Polygon((CHAMFER6_SIZE * 0.999621916911, -CHAMFER6_SIZE * 0.0274958766106), (-CHAMFER6_SIZE * 0.0274958766106, -CHAMFER6_SIZE * 0.999621916911), (0, 0), align=None)
    extrude(amount=2.3)
    with BuildSketch(Plane(origin=(17.5, 13.79, 2.3), x_dir=(-0.9996219169112965, -0.027495876610592135, 0), z_dir=(0, 0, 1))) as chamfer6_piece_2:
        Polygon((CHAMFER6_SIZE * 0.999621916911, -CHAMFER6_SIZE * 0.0274958766106), (-CHAMFER6_SIZE * 0.0274958766106, -CHAMFER6_SIZE * 0.999621916911), (0, 0), align=None)
    extrude(amount=0.1)


solid = part_1.part
